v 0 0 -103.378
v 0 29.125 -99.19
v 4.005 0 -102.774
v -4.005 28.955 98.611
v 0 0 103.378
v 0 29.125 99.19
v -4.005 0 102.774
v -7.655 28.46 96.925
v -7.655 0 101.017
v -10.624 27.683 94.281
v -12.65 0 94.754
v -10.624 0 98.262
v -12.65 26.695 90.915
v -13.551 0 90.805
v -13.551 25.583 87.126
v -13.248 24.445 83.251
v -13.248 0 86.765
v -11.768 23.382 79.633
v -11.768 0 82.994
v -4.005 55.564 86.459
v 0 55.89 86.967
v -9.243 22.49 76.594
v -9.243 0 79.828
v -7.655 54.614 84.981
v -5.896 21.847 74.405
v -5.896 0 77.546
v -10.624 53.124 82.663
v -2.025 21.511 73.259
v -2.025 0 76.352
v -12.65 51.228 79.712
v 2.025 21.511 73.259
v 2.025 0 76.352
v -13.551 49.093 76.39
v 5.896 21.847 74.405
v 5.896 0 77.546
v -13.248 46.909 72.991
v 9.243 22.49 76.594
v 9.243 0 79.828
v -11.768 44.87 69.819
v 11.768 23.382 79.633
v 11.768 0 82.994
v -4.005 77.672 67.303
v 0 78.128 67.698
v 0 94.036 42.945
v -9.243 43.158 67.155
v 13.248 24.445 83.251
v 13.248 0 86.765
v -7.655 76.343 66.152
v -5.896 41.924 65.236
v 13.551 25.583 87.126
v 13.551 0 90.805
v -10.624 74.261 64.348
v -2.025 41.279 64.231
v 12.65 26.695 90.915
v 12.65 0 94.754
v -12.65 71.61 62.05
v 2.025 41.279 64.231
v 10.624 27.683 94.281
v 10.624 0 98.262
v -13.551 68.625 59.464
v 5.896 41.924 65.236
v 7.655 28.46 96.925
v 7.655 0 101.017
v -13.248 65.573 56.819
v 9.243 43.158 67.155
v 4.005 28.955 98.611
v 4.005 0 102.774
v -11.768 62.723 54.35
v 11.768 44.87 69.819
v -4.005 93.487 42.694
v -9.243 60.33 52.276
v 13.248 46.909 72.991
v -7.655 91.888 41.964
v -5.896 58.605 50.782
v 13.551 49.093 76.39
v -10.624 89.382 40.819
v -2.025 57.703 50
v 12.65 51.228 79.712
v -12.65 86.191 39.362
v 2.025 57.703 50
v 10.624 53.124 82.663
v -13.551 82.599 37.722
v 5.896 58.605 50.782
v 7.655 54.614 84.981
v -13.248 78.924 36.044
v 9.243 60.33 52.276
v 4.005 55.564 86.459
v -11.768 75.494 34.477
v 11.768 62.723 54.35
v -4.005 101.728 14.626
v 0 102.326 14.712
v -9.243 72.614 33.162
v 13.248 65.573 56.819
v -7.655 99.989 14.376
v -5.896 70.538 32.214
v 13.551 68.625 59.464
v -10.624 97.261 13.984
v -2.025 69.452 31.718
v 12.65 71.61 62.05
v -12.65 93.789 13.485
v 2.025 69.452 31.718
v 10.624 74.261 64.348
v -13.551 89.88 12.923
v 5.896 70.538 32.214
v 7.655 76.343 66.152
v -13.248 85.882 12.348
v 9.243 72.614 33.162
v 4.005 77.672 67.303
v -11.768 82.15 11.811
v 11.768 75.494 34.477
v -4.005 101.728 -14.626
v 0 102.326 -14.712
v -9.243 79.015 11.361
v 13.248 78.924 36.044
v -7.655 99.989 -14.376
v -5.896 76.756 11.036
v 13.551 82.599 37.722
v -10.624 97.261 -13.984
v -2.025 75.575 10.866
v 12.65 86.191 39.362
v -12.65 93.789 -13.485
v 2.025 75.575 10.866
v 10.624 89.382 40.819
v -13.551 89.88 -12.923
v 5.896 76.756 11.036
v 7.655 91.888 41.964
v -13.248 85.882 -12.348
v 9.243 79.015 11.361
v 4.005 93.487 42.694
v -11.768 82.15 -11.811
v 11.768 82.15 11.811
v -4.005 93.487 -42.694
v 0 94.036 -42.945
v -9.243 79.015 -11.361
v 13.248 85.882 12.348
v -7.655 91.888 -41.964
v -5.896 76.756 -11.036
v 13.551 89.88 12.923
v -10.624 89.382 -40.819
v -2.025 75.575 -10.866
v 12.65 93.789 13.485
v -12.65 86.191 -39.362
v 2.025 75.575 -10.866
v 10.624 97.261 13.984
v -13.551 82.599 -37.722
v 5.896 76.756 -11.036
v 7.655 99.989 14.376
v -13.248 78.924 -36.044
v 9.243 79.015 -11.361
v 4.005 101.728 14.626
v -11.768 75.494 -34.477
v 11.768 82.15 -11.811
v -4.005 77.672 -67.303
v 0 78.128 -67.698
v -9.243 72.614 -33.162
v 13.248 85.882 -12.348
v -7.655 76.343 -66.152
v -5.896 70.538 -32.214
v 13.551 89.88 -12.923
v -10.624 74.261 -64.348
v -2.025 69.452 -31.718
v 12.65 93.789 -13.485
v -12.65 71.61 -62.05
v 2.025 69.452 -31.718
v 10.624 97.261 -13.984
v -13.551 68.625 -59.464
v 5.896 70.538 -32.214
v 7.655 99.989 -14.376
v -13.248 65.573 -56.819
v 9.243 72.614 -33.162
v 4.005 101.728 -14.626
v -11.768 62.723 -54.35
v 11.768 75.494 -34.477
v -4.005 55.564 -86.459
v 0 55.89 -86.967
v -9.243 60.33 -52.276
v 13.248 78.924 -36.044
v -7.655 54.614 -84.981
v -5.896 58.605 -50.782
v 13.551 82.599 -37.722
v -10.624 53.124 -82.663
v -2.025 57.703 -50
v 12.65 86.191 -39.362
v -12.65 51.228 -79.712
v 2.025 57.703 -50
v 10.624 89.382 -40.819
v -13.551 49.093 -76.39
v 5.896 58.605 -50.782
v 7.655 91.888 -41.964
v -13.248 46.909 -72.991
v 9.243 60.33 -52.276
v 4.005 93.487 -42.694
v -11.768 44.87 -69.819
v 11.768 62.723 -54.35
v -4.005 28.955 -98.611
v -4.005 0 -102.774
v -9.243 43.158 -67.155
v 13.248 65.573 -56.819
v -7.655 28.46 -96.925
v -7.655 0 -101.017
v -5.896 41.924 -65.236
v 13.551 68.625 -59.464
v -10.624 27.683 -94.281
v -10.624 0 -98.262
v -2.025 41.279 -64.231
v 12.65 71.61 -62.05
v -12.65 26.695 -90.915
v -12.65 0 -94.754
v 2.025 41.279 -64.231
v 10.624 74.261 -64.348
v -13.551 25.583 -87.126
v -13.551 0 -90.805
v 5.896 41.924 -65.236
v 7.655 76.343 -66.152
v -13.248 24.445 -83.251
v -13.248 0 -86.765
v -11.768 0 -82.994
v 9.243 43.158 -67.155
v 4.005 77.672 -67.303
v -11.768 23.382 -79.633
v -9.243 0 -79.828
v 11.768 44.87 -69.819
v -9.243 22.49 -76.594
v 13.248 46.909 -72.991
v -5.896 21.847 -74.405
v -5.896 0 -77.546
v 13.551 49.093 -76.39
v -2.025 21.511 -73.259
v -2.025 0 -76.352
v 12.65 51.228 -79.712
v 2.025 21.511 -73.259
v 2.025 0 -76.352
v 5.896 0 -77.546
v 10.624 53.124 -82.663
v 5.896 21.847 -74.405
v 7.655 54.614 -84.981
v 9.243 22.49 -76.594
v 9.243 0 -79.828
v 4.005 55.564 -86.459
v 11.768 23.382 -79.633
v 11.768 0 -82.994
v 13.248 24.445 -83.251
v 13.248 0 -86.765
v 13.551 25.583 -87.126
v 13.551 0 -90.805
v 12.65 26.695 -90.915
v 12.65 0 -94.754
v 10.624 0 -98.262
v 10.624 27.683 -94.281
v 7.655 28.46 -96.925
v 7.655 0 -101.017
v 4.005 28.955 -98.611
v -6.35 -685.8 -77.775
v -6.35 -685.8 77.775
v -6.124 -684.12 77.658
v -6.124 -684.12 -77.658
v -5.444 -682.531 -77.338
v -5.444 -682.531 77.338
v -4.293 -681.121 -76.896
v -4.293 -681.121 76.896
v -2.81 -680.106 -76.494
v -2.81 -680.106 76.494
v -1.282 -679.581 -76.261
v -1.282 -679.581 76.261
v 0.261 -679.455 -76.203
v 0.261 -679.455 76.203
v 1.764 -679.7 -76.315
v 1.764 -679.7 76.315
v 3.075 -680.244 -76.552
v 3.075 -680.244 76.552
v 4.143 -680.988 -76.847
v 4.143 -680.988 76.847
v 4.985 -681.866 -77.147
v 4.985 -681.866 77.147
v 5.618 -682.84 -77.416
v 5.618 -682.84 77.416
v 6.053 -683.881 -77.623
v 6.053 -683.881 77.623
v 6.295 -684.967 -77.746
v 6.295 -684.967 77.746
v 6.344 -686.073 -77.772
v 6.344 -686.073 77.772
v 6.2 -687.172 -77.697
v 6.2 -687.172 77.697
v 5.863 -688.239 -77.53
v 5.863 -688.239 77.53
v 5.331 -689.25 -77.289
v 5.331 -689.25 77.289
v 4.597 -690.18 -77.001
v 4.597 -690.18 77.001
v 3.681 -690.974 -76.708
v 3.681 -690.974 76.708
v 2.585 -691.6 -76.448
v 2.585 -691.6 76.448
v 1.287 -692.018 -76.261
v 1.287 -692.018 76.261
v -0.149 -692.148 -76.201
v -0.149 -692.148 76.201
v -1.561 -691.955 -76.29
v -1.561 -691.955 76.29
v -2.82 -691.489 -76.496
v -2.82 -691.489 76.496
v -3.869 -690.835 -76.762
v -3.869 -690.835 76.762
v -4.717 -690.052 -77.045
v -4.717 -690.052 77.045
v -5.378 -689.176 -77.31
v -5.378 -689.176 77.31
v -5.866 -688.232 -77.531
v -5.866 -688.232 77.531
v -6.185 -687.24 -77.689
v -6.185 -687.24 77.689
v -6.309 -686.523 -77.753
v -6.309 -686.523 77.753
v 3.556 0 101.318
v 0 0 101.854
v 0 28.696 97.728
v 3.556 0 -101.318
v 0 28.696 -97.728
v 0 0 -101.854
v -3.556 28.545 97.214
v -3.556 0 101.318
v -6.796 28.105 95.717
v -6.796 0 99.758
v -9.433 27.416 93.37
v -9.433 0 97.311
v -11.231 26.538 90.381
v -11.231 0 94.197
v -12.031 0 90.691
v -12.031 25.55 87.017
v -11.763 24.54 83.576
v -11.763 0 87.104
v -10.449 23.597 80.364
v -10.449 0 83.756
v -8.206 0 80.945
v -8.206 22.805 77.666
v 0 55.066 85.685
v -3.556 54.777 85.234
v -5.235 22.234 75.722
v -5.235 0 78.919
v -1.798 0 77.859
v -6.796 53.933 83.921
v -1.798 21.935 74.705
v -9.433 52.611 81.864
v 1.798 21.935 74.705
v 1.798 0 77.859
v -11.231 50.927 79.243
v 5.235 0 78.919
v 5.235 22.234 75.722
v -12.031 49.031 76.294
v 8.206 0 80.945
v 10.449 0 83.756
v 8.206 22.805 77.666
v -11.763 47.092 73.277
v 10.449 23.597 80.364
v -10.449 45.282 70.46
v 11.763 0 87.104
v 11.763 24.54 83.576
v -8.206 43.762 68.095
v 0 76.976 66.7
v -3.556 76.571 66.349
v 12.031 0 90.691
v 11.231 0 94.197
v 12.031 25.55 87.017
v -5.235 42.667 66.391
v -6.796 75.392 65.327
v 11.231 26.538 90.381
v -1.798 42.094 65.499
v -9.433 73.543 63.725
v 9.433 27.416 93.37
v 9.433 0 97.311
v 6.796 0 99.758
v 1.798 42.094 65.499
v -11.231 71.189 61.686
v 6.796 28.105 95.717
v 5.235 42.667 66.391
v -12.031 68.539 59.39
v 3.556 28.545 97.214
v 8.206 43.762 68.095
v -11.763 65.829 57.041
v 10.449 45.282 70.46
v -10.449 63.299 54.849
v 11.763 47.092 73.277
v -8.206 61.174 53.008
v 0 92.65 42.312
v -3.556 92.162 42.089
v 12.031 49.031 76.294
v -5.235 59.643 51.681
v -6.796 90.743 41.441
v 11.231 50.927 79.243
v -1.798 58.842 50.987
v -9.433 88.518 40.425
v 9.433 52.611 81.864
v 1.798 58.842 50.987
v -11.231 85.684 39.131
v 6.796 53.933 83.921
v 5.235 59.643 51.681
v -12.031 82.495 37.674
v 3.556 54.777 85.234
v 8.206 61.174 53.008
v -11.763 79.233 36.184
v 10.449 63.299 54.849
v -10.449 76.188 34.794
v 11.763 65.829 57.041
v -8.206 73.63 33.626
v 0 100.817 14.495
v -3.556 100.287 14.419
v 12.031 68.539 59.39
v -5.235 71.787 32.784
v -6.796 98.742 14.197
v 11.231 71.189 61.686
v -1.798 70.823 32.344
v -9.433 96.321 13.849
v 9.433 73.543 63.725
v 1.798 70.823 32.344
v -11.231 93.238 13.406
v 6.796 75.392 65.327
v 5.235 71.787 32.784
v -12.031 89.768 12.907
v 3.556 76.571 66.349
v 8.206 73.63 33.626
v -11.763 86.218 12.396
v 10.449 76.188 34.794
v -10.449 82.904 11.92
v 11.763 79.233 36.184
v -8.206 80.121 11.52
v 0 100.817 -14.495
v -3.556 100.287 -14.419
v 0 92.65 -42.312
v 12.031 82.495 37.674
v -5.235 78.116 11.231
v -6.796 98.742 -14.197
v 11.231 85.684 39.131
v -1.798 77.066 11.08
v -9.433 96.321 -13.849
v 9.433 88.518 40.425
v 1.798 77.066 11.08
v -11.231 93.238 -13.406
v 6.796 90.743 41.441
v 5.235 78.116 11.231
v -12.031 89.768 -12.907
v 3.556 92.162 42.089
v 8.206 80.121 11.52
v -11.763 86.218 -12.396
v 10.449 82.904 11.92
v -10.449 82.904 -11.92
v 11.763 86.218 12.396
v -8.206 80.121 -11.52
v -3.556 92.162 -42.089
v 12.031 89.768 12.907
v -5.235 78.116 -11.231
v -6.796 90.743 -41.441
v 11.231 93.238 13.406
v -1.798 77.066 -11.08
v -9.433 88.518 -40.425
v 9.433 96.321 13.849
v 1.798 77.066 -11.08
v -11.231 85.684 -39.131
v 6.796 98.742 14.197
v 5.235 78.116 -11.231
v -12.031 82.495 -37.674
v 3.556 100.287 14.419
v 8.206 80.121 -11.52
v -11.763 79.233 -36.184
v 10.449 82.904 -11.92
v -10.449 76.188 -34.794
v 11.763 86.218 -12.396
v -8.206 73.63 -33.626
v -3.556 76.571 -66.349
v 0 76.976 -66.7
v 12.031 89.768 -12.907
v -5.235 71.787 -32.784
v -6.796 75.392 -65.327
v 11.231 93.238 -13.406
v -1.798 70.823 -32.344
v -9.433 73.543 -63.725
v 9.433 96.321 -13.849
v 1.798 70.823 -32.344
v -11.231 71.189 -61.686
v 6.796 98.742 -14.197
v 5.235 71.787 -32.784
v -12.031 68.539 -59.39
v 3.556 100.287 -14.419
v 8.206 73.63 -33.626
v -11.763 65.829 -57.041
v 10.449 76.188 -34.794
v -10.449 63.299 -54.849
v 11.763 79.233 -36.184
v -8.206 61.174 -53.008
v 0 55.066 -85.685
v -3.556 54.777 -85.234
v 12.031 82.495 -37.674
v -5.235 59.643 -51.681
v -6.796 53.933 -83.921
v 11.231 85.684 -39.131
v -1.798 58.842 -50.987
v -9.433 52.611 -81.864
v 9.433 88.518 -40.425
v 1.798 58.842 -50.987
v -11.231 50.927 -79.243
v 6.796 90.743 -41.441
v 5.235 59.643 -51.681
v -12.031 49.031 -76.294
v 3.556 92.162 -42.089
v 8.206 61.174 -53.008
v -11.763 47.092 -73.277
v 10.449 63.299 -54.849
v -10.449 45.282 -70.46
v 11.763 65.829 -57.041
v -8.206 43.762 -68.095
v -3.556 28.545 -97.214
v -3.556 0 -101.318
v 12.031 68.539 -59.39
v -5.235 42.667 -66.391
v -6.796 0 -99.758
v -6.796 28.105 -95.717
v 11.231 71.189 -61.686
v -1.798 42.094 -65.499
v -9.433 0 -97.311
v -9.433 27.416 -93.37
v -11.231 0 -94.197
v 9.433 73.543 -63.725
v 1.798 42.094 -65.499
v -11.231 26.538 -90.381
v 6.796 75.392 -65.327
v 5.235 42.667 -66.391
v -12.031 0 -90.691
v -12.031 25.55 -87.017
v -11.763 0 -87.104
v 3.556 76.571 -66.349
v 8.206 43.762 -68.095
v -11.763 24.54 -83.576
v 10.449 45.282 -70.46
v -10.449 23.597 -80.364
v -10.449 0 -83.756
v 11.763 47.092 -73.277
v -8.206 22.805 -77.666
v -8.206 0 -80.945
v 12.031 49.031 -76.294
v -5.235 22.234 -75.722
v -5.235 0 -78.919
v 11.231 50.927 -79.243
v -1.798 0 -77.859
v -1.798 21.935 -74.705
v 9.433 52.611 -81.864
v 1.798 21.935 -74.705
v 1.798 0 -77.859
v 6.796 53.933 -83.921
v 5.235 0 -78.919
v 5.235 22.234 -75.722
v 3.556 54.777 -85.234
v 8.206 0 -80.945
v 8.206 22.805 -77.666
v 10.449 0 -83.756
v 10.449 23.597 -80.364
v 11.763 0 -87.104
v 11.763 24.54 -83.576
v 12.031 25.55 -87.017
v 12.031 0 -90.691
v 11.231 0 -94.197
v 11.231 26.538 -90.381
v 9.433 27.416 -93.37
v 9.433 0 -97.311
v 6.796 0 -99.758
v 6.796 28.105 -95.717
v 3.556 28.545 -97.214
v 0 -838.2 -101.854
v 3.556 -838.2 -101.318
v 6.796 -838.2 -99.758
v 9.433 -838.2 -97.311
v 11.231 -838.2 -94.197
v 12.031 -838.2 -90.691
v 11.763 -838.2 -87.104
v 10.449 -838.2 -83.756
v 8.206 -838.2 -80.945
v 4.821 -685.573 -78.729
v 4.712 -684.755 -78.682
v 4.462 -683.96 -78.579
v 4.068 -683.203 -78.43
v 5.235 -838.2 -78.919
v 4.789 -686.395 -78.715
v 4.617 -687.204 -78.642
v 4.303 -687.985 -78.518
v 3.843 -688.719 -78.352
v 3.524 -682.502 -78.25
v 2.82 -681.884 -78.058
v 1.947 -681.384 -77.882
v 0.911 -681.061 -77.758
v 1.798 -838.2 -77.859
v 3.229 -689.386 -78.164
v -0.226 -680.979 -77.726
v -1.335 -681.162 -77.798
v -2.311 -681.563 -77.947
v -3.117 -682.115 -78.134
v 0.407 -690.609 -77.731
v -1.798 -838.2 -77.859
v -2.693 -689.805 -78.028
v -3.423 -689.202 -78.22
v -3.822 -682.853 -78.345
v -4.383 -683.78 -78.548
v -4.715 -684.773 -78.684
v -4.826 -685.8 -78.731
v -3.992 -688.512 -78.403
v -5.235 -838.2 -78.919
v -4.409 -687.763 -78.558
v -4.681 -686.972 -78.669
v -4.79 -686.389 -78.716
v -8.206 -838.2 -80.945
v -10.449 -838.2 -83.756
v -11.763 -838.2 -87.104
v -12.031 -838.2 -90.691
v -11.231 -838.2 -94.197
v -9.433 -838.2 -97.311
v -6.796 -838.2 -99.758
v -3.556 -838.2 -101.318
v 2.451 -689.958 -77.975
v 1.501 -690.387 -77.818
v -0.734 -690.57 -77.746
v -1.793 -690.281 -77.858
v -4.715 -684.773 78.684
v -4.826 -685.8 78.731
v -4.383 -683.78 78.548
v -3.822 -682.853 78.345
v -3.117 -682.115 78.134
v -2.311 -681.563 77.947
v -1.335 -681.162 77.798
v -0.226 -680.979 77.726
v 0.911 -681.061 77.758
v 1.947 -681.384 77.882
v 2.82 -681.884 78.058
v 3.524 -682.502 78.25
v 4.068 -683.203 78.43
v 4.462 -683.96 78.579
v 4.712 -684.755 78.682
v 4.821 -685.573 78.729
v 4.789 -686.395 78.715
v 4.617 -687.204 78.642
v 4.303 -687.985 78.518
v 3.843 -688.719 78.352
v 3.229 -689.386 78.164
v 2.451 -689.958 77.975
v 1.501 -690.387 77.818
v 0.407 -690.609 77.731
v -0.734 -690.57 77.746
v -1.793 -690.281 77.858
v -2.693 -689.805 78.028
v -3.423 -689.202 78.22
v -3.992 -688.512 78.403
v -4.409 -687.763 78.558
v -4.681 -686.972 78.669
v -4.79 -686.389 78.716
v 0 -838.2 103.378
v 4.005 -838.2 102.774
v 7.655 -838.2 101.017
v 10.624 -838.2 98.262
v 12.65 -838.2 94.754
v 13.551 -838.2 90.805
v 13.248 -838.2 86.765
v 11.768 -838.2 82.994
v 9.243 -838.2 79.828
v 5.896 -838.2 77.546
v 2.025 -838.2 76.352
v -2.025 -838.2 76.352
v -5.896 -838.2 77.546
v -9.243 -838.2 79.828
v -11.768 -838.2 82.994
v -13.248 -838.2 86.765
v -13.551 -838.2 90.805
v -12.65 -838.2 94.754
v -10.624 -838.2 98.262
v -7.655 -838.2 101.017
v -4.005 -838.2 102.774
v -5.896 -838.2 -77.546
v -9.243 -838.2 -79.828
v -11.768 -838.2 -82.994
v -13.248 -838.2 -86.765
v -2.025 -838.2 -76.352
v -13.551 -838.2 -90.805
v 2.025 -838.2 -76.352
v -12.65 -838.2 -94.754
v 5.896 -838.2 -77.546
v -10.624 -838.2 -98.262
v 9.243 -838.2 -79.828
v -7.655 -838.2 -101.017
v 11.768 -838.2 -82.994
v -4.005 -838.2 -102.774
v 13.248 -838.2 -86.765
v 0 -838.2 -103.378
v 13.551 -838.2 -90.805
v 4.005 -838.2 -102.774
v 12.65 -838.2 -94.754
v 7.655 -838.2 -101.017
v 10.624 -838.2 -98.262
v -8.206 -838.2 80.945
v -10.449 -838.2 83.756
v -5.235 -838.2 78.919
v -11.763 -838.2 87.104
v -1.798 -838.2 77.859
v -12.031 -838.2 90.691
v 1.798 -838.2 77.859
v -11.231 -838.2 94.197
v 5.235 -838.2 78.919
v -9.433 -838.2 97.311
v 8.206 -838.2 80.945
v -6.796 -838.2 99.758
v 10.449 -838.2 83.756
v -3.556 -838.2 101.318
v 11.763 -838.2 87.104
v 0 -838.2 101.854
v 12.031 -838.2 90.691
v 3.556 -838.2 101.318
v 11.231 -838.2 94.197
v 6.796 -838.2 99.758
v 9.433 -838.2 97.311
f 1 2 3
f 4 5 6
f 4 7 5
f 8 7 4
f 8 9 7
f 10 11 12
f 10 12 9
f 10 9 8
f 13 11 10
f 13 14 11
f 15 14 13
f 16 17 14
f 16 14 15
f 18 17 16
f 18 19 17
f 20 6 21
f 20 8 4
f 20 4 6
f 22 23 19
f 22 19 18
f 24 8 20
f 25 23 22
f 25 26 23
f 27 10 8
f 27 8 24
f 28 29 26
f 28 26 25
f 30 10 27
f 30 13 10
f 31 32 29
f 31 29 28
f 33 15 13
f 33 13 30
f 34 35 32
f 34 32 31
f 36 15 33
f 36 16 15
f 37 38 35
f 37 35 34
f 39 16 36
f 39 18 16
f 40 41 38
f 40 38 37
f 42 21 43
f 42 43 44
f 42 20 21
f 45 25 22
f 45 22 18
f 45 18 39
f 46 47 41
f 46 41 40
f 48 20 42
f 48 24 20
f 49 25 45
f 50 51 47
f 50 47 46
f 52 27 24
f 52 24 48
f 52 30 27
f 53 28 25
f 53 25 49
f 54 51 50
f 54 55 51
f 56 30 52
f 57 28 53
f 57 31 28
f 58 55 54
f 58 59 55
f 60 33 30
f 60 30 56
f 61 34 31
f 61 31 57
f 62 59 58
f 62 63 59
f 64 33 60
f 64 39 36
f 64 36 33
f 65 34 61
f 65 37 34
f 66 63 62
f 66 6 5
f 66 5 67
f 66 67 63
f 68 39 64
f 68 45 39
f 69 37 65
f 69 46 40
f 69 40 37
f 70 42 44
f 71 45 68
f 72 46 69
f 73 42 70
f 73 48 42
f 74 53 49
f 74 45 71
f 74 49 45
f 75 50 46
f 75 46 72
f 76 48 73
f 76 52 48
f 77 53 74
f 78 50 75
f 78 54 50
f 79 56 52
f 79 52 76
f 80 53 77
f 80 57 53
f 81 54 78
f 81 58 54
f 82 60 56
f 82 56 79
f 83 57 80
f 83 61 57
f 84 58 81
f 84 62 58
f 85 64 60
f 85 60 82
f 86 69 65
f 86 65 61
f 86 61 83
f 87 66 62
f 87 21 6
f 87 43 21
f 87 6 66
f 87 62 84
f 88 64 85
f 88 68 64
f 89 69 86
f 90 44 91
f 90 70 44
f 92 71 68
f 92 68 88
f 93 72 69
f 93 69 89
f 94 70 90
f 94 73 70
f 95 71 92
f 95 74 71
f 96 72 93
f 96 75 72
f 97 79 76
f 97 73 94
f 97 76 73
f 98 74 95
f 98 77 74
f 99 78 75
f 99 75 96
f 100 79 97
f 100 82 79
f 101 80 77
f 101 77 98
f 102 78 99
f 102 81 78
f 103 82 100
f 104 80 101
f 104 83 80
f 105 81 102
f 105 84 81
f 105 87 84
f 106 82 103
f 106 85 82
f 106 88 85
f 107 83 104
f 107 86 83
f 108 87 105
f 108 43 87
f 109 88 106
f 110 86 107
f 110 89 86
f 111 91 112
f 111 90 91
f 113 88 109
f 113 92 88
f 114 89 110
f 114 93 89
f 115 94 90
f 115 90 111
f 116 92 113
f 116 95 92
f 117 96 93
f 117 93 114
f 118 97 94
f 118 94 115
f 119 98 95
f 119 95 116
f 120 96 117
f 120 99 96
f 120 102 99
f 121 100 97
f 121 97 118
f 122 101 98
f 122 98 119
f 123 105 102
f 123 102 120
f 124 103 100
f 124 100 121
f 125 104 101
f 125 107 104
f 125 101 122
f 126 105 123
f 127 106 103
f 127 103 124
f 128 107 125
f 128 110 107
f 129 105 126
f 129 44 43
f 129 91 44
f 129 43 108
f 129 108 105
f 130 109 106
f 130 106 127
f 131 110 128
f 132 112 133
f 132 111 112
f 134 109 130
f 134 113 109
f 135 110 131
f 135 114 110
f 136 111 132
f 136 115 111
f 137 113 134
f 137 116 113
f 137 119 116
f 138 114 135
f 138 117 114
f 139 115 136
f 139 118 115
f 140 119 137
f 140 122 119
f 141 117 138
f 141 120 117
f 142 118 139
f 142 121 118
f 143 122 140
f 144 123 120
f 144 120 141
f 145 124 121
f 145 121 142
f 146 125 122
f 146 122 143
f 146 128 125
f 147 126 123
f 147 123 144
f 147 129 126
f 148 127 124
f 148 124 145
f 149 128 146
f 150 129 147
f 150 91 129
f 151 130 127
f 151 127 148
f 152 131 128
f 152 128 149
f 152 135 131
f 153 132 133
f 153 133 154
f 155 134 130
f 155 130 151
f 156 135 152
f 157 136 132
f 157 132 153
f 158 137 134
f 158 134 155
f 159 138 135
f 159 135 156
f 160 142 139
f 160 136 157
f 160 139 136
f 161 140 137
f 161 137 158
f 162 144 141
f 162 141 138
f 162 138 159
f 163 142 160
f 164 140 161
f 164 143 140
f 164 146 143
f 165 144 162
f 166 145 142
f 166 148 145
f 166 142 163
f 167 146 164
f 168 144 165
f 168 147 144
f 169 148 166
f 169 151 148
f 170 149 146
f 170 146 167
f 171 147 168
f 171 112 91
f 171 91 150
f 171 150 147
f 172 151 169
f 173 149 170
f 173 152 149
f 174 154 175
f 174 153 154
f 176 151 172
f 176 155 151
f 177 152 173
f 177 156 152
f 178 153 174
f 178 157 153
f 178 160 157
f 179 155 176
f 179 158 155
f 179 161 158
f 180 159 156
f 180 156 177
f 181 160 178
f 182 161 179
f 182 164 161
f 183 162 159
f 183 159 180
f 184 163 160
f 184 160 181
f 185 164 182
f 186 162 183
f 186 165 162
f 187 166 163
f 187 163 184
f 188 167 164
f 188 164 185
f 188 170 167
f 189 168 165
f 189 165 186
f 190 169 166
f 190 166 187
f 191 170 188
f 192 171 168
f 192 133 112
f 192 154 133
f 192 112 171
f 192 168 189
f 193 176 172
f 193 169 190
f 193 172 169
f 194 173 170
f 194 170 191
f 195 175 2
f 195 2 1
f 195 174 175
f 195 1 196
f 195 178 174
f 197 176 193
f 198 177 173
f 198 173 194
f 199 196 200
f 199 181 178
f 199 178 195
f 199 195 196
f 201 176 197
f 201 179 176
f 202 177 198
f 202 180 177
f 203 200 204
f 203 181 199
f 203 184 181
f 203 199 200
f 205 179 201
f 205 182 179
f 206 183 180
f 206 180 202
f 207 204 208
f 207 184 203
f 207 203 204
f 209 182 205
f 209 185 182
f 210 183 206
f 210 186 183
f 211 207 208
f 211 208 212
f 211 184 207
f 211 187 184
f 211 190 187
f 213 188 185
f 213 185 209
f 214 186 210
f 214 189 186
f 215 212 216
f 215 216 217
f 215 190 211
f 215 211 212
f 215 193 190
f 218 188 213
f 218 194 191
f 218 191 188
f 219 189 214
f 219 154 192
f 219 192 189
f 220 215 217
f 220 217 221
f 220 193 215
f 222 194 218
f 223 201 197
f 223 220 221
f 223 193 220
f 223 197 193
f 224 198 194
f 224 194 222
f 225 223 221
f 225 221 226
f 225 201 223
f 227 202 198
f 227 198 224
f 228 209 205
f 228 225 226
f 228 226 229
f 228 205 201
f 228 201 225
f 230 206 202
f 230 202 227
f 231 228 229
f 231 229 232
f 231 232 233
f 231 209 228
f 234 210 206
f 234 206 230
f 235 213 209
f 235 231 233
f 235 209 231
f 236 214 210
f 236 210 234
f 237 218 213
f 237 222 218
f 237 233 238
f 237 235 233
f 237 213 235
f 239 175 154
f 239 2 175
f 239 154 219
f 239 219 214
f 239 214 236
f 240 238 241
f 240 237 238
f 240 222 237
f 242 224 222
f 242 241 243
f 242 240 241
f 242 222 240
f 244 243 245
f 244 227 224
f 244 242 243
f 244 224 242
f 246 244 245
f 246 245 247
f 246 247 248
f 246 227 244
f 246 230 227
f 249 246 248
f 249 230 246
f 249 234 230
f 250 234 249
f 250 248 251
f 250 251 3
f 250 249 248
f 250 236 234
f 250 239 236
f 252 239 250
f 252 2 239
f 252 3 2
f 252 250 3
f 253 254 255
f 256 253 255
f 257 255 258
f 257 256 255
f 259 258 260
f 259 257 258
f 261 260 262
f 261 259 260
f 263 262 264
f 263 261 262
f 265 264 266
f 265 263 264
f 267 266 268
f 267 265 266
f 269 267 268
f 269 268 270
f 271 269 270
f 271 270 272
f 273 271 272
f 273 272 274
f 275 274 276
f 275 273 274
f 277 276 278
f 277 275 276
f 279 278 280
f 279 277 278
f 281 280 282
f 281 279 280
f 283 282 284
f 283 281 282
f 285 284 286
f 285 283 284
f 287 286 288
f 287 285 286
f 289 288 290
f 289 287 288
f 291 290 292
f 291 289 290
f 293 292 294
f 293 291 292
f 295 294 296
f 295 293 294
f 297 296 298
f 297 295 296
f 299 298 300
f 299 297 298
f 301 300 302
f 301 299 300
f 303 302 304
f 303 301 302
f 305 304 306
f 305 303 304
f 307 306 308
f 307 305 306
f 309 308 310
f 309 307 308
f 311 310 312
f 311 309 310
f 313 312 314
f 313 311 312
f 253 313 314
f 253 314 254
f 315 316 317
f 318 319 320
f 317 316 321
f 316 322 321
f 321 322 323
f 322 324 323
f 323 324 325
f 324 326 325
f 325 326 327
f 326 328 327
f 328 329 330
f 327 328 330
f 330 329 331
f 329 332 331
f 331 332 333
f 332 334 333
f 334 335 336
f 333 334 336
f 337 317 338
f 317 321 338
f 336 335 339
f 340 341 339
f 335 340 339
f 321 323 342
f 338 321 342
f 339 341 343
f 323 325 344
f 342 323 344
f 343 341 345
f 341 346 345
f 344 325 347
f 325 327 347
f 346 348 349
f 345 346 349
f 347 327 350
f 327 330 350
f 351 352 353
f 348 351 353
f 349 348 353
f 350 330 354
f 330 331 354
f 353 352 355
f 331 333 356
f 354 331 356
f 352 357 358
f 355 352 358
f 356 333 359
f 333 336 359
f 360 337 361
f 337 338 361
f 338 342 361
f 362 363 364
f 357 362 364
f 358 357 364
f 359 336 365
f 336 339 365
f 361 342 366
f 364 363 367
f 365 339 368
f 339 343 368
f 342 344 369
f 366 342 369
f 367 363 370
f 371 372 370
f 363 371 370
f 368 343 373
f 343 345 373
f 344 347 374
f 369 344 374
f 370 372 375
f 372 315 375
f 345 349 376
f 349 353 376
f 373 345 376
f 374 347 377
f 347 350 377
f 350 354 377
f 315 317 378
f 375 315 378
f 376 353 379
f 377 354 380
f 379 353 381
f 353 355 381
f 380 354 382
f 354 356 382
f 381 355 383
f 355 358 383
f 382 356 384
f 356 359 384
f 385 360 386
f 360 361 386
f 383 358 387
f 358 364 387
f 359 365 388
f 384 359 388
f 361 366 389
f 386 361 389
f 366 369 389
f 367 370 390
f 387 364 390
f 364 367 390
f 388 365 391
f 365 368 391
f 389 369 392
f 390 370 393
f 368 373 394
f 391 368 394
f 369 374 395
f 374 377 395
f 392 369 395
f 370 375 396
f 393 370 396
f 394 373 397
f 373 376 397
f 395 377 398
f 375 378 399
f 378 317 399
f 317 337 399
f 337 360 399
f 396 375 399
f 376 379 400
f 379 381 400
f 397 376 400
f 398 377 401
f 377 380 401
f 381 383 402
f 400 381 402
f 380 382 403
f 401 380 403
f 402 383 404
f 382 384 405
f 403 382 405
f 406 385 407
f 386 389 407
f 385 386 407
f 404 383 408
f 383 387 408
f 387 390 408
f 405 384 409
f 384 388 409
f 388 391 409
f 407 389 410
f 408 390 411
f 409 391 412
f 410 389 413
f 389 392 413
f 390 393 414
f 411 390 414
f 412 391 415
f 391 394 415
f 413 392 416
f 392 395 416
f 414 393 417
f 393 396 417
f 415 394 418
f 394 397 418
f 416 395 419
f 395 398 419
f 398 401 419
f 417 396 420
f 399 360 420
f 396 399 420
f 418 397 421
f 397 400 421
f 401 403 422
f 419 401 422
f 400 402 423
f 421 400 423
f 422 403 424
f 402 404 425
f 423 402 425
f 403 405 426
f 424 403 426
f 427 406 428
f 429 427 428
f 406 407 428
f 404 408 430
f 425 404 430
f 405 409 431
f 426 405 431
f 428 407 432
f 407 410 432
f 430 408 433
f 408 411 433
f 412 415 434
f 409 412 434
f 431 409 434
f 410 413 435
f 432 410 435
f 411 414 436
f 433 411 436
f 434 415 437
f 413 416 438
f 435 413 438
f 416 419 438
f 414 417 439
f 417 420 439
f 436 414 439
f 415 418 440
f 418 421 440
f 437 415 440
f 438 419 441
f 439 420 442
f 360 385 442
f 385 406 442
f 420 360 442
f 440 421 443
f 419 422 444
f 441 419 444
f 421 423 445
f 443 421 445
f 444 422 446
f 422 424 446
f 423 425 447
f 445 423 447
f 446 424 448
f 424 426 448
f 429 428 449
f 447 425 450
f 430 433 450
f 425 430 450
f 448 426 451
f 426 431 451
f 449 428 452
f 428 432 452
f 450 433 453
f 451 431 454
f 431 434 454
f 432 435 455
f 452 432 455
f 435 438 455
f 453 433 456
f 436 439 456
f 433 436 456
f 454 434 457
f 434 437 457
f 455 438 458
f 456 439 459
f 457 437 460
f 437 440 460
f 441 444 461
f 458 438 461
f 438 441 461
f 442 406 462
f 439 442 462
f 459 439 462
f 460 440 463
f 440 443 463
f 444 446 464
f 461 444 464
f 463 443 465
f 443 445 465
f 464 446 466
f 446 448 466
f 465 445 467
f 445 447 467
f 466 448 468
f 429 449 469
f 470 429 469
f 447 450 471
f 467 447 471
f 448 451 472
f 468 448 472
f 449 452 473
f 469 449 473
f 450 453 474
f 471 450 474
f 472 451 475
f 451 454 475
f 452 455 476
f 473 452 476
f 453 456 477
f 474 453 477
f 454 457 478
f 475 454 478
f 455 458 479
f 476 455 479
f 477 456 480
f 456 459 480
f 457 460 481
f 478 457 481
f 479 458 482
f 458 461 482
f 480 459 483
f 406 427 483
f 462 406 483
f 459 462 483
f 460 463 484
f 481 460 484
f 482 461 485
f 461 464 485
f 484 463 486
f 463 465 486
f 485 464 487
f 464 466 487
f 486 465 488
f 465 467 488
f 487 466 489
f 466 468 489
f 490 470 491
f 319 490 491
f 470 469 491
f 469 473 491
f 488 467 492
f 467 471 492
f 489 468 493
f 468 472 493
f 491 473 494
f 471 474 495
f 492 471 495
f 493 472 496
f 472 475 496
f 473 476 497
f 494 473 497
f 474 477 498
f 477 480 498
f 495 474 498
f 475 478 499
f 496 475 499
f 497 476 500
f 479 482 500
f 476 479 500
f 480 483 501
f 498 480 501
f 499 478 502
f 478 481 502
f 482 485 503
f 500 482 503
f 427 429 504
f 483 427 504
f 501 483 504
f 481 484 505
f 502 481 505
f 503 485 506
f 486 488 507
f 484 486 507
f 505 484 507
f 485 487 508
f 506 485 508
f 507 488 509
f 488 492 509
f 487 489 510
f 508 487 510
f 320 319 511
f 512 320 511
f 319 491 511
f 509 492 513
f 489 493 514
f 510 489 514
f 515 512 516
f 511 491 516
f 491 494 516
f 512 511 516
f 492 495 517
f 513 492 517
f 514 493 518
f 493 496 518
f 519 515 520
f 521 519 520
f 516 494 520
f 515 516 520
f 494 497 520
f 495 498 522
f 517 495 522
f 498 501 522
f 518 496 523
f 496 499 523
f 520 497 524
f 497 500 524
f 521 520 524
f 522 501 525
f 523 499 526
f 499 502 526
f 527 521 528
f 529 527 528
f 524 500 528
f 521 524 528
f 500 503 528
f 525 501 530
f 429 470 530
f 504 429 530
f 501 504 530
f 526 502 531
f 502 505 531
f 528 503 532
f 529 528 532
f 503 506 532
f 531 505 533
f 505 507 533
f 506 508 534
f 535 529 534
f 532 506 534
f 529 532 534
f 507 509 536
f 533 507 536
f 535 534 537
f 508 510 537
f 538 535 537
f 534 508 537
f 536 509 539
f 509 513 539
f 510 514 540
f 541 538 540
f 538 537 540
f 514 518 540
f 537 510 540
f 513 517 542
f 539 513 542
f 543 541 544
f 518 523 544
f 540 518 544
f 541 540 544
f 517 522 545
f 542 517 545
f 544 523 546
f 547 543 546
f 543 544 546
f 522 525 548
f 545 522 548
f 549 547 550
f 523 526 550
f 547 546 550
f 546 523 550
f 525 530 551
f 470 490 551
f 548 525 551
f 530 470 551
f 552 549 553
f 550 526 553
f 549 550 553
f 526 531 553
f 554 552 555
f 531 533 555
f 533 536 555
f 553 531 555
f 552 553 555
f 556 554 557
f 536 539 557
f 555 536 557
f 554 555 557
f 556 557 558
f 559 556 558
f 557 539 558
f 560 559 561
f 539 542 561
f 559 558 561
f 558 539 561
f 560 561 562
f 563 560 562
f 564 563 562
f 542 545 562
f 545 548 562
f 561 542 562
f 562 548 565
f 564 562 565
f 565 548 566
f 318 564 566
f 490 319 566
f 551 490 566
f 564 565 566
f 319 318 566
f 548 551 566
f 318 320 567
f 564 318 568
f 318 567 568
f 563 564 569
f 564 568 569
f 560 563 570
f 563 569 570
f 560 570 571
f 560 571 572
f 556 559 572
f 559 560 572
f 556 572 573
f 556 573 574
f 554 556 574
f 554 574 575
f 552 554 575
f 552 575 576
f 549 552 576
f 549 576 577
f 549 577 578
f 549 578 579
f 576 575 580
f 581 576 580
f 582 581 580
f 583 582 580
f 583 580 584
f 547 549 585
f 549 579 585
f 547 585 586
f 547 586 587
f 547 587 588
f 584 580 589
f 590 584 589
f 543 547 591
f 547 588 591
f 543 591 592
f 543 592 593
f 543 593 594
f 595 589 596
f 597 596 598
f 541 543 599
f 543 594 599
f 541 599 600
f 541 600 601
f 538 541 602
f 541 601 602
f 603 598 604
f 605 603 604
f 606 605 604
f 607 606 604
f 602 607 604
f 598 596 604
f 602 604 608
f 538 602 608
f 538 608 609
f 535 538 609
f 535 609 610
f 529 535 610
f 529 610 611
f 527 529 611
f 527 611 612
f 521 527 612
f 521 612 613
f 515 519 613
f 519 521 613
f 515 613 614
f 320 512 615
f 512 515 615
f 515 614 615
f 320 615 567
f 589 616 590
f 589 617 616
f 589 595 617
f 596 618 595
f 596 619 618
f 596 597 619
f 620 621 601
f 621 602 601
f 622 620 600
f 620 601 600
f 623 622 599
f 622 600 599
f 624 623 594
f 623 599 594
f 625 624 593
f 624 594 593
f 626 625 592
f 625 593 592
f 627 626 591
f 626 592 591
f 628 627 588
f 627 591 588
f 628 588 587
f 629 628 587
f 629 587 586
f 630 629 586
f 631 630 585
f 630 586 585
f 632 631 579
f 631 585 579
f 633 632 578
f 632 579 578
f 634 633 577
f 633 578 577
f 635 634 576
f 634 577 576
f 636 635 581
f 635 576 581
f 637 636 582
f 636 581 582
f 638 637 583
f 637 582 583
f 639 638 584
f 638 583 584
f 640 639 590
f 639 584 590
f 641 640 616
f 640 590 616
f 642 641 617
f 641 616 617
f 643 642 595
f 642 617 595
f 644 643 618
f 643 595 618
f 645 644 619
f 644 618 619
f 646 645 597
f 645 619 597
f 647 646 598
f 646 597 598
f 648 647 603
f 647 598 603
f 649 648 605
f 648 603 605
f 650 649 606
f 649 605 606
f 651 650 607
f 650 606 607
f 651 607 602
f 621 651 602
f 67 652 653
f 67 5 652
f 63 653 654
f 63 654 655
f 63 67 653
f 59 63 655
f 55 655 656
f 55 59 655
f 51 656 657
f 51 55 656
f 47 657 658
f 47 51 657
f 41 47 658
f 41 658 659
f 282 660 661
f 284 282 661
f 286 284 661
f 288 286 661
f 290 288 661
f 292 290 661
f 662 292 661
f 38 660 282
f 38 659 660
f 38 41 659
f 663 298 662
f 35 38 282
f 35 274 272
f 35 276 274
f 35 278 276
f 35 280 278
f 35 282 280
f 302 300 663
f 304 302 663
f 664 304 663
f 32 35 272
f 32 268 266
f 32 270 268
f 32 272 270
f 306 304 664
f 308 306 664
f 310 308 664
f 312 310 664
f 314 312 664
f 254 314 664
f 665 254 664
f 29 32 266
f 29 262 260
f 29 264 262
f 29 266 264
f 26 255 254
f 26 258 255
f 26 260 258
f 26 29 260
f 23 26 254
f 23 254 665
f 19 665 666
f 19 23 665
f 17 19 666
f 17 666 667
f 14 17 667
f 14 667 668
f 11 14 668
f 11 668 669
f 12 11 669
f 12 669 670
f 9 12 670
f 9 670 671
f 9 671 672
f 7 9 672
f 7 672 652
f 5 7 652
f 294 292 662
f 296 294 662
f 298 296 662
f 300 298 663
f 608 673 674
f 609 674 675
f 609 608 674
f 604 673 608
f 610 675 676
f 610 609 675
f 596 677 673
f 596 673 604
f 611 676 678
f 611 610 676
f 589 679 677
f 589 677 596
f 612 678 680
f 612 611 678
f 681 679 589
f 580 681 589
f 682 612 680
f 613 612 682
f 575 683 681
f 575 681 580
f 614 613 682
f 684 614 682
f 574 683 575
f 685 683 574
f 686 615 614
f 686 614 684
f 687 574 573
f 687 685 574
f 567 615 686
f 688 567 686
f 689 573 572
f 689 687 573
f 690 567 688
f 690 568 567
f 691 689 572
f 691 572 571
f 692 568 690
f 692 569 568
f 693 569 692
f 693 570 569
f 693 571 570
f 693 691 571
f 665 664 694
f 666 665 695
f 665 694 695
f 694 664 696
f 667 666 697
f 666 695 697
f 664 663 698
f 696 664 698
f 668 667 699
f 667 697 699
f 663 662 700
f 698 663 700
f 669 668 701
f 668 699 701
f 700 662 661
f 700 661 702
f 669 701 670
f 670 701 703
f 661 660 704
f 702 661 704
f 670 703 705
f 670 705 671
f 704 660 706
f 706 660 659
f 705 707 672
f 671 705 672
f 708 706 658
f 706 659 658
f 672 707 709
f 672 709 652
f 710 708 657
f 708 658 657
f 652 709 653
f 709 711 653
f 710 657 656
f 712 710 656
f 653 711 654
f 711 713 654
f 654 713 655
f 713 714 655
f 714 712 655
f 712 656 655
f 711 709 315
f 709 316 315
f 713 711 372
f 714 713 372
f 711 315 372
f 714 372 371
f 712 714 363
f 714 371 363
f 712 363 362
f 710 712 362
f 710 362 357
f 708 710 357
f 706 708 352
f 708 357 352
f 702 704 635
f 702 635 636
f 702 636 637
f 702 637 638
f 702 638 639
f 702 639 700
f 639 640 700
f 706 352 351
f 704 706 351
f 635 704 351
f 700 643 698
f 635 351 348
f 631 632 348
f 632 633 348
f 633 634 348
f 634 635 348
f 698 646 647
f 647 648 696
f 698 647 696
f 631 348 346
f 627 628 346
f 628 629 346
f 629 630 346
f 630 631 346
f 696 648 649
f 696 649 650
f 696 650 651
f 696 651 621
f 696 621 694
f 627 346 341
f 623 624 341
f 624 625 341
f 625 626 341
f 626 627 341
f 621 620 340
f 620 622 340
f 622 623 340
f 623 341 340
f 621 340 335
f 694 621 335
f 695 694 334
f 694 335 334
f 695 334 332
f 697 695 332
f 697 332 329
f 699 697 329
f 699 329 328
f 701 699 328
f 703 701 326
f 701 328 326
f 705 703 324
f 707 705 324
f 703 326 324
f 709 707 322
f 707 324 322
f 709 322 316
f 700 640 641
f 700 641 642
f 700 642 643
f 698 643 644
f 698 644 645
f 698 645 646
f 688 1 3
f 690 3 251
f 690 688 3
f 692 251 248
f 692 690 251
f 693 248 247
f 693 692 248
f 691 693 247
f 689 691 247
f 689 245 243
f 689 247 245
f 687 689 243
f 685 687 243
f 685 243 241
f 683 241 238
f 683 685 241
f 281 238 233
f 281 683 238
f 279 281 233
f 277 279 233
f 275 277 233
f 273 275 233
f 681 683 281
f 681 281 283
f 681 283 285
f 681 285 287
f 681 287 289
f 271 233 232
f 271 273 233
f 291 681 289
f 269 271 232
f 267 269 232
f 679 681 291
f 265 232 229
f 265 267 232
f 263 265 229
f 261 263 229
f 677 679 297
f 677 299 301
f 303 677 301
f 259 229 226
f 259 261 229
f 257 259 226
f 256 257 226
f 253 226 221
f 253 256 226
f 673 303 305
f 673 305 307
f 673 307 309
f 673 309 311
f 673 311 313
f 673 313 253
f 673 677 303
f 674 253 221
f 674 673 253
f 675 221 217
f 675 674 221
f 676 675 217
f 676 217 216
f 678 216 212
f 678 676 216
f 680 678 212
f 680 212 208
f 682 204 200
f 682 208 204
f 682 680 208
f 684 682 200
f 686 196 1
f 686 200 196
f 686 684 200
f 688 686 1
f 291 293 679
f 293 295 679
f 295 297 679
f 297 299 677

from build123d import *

# Parameters (mm, degrees)
SWEEP1_PROFILE_R = 13.589
SWEEP2_PROFILE_R = 6.35
SHELL1_T         = -1.524


with BuildPart() as part:
    # Sweep1: sweep along a path in Sketch2
    with BuildLine(Plane.YZ) as sweep1_path:
        Line((-838.2, 89.789), (0, 89.789))
        ThreePointArc((0, 89.789), (89.789, 0), (0, -89.789))
        Line((0, -89.789), (-838.2, -89.789))
    # Sweep1 profile (on start of the path) → Sweep1 (sweep)
    with BuildSketch(Plane(origin=(0, -838.2, 89.789), x_dir=(0, 0, 1), z_dir=(0, 1, 0))):
        Circle(SWEEP1_PROFILE_R)
    sweep(path=sweep1_path.line)

    # Sweep2: sweep along a path in Sketch2<3>
    with BuildLine(Plane.YZ) as sweep2_path:
        Line((-685.8, 89.789), (-685.8, -89.789))
    # Sweep2 profile (on start of the path) → Sweep2 (sweep)
    with BuildSketch(Plane(origin=(0, -685.8, 89.789), x_dir=(-1, 0, 0), z_dir=(0, 0, -1))):
        Circle(SWEEP2_PROFILE_R)
    sweep(path=sweep2_path.line)

    # Shell1
    shell1_openings = [part.faces().sort_by_distance(p)[0] for p in [
        (0, -838.2, 89.789),
        (0, -838.2, -89.789),
    ]]
    offset(amount=SHELL1_T, openings=shell1_openings, kind=Kind.INTERSECTION)


solid = part.part
